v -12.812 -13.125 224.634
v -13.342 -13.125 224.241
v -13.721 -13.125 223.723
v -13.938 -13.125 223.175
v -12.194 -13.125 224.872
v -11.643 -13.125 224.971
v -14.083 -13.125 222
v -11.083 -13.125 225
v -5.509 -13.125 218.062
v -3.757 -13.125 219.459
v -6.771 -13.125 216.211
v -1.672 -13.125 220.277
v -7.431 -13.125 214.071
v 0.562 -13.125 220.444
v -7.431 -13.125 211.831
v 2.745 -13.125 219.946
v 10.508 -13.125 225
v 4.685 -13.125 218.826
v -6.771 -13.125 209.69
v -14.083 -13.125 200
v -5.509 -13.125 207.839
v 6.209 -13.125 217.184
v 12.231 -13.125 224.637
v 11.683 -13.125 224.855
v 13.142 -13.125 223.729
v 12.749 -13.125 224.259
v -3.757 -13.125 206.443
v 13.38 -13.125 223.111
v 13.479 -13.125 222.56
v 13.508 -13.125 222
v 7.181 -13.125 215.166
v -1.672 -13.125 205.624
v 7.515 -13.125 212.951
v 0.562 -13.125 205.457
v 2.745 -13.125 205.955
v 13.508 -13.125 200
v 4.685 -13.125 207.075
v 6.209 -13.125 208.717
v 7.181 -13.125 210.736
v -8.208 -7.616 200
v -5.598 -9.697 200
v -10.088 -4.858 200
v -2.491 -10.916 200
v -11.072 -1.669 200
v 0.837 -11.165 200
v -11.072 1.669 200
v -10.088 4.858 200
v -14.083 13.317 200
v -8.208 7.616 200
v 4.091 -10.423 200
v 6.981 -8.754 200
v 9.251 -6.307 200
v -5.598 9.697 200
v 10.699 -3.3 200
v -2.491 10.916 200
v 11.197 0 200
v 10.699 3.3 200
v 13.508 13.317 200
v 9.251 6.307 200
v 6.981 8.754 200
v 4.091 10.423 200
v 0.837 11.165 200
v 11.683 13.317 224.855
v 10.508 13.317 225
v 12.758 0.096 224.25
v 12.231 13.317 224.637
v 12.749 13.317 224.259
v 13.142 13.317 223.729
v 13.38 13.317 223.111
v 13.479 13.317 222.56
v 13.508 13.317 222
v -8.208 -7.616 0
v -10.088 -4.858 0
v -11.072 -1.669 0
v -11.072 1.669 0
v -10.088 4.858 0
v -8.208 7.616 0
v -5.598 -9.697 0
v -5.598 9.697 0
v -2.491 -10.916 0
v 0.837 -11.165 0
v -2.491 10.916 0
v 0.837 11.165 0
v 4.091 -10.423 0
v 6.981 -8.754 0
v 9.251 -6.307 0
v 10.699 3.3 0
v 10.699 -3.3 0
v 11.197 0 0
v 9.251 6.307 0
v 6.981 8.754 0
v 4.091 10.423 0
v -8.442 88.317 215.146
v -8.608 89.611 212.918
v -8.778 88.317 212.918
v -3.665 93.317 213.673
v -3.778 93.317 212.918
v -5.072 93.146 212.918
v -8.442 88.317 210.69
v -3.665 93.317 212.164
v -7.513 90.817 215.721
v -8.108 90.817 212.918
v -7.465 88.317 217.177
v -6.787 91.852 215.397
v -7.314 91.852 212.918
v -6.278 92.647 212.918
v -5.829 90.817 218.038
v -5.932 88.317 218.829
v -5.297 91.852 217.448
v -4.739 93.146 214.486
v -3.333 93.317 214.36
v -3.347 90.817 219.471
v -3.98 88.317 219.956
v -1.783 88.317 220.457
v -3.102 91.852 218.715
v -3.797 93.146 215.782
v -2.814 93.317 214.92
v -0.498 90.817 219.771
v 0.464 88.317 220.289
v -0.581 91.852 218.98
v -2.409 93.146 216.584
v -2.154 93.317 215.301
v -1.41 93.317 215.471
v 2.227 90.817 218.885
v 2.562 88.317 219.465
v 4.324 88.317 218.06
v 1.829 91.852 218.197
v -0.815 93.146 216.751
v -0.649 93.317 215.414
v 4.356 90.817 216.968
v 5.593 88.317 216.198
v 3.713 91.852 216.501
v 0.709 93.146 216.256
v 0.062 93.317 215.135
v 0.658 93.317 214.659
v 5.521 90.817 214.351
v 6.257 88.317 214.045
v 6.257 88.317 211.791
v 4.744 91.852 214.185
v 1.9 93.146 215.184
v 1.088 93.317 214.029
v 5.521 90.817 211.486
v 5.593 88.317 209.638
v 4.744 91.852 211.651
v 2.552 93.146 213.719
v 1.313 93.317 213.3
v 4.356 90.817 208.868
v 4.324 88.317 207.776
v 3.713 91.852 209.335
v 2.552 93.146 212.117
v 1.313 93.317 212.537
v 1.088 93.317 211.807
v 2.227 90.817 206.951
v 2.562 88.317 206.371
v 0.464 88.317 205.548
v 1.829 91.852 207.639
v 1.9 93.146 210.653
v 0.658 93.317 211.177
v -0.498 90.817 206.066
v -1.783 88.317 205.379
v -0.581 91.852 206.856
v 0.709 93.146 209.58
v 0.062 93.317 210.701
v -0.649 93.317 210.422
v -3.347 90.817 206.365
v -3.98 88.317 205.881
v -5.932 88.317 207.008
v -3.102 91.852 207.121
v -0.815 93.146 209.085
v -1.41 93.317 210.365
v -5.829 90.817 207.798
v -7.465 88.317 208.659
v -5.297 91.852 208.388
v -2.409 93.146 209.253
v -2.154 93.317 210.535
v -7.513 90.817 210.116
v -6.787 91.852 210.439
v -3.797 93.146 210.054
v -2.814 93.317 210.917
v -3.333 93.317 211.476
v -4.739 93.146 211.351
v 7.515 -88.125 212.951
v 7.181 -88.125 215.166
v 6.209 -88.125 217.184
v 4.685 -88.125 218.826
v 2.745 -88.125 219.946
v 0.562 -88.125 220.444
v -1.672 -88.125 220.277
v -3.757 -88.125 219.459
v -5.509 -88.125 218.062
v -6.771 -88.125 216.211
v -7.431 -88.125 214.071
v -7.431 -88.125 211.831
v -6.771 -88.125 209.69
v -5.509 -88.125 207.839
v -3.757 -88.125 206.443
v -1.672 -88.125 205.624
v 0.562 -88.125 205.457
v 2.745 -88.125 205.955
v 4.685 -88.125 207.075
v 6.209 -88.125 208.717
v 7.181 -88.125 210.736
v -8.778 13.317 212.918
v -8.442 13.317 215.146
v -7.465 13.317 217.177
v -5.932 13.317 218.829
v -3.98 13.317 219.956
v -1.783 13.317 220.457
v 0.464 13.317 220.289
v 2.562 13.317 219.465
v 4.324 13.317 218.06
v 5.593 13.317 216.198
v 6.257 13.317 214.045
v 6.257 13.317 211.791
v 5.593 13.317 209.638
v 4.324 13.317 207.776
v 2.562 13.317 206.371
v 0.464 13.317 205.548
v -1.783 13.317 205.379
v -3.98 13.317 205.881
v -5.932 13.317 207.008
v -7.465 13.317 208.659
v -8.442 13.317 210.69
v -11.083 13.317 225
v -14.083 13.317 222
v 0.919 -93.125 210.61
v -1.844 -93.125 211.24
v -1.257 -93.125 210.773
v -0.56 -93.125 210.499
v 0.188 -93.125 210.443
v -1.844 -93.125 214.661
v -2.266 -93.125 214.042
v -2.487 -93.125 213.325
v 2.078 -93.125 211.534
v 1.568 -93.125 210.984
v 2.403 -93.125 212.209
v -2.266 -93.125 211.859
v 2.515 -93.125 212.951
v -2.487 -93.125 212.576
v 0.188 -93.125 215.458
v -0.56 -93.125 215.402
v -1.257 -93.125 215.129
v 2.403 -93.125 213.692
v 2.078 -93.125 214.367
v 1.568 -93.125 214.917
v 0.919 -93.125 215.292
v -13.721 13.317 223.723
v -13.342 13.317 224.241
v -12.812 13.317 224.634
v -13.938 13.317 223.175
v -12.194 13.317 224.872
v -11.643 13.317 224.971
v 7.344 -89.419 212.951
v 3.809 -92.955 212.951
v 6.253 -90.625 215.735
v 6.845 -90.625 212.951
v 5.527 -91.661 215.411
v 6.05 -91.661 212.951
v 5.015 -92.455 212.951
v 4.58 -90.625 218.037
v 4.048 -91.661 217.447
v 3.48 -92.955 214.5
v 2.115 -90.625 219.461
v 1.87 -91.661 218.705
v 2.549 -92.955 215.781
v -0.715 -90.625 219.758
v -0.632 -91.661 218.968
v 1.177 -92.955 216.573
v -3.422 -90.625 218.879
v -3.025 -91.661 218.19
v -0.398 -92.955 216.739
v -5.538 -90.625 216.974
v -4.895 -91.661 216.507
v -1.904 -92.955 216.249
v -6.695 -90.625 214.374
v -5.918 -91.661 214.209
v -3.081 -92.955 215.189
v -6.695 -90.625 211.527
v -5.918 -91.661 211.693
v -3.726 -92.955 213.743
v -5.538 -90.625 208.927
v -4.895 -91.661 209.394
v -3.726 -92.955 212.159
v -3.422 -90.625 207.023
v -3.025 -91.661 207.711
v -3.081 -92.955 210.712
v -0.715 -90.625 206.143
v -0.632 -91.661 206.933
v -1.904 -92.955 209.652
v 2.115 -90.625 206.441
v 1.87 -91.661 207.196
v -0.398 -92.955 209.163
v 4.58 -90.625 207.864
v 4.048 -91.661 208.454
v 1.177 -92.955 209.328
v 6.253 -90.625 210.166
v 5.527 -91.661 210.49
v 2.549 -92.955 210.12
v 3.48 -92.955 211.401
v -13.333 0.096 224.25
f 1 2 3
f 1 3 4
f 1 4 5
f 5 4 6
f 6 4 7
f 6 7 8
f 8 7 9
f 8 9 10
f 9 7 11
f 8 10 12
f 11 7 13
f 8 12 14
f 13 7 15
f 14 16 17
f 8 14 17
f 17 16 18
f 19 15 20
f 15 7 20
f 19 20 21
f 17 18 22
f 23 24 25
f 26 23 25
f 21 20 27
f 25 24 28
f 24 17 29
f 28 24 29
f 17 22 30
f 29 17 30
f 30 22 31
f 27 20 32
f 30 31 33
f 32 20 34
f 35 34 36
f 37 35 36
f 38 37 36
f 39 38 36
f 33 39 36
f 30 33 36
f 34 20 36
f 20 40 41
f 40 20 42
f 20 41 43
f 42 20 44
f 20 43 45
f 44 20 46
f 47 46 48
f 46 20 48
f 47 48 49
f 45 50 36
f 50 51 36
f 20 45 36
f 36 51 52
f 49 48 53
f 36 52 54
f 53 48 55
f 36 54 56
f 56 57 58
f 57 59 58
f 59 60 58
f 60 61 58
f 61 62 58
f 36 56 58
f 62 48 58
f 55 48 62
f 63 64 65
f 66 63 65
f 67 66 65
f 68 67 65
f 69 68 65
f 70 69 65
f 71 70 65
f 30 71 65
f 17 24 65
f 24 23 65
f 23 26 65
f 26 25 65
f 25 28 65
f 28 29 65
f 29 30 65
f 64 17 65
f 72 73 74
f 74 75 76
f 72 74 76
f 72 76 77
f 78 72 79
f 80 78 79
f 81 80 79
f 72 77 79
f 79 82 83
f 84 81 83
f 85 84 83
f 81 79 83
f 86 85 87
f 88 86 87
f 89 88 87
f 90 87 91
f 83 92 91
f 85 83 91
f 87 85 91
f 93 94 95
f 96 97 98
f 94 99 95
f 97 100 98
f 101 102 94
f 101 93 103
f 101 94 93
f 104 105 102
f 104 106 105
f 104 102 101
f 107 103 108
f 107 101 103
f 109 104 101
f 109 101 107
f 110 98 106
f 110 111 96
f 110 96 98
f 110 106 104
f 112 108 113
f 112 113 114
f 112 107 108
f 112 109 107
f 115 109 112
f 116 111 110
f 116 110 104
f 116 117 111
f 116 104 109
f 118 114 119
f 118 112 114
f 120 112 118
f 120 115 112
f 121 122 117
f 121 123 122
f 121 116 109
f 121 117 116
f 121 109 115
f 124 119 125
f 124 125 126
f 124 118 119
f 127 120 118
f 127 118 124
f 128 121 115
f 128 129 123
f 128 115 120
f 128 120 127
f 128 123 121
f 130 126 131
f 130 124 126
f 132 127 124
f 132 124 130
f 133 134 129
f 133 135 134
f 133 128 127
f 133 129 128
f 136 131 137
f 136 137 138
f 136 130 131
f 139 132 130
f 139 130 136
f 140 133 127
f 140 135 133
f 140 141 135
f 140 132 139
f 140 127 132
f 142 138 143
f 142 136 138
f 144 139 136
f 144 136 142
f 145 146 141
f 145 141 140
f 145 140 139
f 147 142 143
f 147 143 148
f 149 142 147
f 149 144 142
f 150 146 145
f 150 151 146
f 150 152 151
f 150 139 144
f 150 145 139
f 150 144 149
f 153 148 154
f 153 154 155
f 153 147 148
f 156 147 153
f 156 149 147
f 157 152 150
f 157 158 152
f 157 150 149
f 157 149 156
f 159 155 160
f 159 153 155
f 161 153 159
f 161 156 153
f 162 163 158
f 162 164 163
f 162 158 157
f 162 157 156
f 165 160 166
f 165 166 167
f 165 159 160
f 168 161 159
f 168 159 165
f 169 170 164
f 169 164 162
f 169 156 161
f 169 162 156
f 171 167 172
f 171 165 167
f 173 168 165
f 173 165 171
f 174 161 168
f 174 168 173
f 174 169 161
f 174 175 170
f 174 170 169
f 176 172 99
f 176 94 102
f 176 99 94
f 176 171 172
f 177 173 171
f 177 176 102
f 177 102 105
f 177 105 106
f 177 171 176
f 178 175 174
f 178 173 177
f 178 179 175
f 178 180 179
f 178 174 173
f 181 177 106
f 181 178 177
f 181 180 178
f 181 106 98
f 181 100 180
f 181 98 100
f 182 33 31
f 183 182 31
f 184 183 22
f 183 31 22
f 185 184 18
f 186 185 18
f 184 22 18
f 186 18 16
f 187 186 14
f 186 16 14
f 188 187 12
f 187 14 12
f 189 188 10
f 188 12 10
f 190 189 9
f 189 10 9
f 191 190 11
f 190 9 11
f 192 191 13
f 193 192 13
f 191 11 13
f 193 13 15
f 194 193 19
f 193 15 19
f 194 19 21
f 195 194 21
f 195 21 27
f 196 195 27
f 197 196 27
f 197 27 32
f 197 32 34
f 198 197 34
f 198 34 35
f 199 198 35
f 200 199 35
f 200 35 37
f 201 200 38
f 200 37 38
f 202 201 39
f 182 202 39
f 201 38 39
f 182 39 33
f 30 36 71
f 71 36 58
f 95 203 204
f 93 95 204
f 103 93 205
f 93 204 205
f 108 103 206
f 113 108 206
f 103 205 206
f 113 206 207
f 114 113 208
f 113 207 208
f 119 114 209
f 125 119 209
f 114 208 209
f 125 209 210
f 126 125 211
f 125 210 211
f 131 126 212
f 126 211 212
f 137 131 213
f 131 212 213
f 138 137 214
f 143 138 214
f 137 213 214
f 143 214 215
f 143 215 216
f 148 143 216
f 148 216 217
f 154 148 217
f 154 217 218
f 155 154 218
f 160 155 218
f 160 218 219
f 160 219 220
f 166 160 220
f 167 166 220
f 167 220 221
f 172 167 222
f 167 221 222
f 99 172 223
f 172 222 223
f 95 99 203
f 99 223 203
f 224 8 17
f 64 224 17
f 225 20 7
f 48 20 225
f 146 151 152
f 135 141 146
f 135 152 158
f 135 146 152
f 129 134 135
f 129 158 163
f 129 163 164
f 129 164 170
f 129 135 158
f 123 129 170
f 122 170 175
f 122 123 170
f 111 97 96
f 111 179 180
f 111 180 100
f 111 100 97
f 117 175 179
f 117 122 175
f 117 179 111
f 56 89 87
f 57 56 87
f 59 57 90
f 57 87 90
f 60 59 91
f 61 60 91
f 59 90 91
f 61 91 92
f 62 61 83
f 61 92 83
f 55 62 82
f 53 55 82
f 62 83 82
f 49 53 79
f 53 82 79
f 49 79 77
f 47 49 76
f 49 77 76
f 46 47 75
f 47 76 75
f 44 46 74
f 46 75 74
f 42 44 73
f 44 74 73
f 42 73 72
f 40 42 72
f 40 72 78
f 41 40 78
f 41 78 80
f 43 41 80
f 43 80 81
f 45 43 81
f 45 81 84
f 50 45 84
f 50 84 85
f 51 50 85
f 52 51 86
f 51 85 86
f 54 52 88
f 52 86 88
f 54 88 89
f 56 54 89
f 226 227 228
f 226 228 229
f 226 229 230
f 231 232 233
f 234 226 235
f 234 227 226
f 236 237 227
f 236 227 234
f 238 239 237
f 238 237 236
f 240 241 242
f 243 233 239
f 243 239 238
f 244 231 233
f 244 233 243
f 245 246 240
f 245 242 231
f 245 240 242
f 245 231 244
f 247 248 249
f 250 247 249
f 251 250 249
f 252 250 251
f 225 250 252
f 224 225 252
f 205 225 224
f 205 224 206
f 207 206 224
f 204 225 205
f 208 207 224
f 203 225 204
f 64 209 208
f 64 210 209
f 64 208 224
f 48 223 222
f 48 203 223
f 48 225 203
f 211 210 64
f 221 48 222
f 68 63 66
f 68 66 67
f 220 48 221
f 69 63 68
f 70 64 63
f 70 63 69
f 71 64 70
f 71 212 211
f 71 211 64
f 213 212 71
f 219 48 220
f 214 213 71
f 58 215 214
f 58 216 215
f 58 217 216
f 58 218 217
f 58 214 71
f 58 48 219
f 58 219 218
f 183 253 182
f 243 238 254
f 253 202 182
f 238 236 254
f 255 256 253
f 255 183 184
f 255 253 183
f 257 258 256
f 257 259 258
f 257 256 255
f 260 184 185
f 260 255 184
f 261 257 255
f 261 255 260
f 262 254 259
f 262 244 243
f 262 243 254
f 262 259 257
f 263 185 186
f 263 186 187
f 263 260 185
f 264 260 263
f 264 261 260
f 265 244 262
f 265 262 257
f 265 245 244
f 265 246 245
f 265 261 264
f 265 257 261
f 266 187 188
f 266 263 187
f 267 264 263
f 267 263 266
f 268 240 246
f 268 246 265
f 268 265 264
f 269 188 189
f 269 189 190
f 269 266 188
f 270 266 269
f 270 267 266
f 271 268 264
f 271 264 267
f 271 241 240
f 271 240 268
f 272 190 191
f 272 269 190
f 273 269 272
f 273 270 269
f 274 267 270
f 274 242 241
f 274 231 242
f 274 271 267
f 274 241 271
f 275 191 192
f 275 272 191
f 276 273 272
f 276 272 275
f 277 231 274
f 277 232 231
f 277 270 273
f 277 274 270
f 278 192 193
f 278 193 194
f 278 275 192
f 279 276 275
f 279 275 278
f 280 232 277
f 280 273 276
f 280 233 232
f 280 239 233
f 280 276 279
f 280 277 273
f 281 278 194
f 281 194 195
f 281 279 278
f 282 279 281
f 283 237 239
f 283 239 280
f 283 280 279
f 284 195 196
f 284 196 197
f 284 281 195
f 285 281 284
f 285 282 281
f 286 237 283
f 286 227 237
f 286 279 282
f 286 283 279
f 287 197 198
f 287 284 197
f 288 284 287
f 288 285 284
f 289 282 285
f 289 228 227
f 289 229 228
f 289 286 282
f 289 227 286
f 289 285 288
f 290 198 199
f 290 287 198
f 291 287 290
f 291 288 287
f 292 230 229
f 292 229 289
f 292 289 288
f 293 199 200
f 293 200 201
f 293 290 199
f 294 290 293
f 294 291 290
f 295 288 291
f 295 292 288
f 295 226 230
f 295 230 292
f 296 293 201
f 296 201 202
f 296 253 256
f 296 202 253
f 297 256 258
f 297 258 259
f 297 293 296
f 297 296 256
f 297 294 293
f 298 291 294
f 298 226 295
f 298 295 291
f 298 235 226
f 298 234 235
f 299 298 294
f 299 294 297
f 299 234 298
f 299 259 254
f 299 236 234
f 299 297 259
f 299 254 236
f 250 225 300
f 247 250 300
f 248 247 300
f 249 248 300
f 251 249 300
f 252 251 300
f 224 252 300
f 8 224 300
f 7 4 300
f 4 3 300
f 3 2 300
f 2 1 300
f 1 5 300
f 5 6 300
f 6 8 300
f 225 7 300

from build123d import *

# Parameters (mm, degrees)
F0_R        = 11.1966523668
F1_DEPTH    = 200
F2_W        = 27.5912405923
F2_H        = 26.4416076243
F3_DEPTH    = 25
F5_R        = 7.5599777125
F6_DEPTH    = 80
F4_R        = 7.5148466093
F7_DEPTH    = 80
F8_T1_DEPTH = 41.4416076243
F9_R        = 5
F10_R       = 5


# Not quite as in the source:
# - a fillet or chamfer that OpenCascade refuses, or shapes differently, is made with other operations: its cross-section is extruded or revolved along the edge and cut away or added
# - a feature names something its author has since deleted; it is built from what else it names


with BuildPart() as f1:
    # F0 (on Top) → F1 (new body)
    with BuildSketch(Plane.XY):
        Circle(F0_R)
    extrude(amount=F1_DEPTH)

    # F2 (on face) → F3 (join)
    with BuildSketch(Plane.XY.offset(200)):
        with Locations((-0.2874094062, 0.0958032906)):
            Rectangle(F2_W, F2_H)
    extrude(amount=F3_DEPTH)

    # F5 (on face) → F6 (join)
    with BuildSketch(Plane(origin=(0, 13.3166071028, 0), x_dir=(-1, 0, 0), z_dir=(0, 1, 0))):
        with Locations((1.2183021754, 212.9181474447)):
            Circle(F5_R)
    extrude(amount=F6_DEPTH)

    # F4 (on face) → F7 (join)
    with BuildSketch(Plane.XZ.offset(13.1250005215)):
        with Locations((0, 212.9505872726)):
            Circle(F4_R)
    extrude(amount=F7_DEPTH)

    # F8: fillet of radius 3 on 2 edges, made by hand

    # F8_s2 → F8_t1 (cut)
    with BuildSketch(Plane.XZ.offset(-20.8166071028)):
        with BuildLine():
            add(Edge.make_bspline(
                [(13.50821089, 222), (13.50821089, 225), (10.50821089, 225)],
                knots=[0, 0, 0, 1, 1, 1], degree=2, weights=[1, 1, 1]))
            Line((10.50821089, 225), (13.50821089, 225))
            Line((13.50821089, 225), (13.50821089, 222))
        make_face()
        with BuildLine():
            add(Edge.make_bspline(
                [(-11.0830297023, 225), (-14.0830297023, 225), (-14.0830297023, 222)],
                knots=[0, 0, 0, 1, 1, 1], degree=2, weights=[1, 1, 1]))
            Line((-14.0830297023, 222), (-14.0830297023, 225))
            Line((-14.0830297023, 225), (-11.0830297023, 225))
        make_face()
    extrude(amount=F8_T1_DEPTH, mode=Mode.SUBTRACT)

    # F9
    f9_edges = [f1.edges().sort_by_distance(p)[0] for p in [
        (6.341676, 93.316607, 212.918147),
    ]]
    fillet(f9_edges, radius=F9_R)

    # F10
    f10_edges = [f1.edges().sort_by_distance(p)[0] for p in [
        (-7.514847, -93.125001, 212.950587),
    ]]
    fillet(f10_edges, radius=F10_R)


solid = f1.part
